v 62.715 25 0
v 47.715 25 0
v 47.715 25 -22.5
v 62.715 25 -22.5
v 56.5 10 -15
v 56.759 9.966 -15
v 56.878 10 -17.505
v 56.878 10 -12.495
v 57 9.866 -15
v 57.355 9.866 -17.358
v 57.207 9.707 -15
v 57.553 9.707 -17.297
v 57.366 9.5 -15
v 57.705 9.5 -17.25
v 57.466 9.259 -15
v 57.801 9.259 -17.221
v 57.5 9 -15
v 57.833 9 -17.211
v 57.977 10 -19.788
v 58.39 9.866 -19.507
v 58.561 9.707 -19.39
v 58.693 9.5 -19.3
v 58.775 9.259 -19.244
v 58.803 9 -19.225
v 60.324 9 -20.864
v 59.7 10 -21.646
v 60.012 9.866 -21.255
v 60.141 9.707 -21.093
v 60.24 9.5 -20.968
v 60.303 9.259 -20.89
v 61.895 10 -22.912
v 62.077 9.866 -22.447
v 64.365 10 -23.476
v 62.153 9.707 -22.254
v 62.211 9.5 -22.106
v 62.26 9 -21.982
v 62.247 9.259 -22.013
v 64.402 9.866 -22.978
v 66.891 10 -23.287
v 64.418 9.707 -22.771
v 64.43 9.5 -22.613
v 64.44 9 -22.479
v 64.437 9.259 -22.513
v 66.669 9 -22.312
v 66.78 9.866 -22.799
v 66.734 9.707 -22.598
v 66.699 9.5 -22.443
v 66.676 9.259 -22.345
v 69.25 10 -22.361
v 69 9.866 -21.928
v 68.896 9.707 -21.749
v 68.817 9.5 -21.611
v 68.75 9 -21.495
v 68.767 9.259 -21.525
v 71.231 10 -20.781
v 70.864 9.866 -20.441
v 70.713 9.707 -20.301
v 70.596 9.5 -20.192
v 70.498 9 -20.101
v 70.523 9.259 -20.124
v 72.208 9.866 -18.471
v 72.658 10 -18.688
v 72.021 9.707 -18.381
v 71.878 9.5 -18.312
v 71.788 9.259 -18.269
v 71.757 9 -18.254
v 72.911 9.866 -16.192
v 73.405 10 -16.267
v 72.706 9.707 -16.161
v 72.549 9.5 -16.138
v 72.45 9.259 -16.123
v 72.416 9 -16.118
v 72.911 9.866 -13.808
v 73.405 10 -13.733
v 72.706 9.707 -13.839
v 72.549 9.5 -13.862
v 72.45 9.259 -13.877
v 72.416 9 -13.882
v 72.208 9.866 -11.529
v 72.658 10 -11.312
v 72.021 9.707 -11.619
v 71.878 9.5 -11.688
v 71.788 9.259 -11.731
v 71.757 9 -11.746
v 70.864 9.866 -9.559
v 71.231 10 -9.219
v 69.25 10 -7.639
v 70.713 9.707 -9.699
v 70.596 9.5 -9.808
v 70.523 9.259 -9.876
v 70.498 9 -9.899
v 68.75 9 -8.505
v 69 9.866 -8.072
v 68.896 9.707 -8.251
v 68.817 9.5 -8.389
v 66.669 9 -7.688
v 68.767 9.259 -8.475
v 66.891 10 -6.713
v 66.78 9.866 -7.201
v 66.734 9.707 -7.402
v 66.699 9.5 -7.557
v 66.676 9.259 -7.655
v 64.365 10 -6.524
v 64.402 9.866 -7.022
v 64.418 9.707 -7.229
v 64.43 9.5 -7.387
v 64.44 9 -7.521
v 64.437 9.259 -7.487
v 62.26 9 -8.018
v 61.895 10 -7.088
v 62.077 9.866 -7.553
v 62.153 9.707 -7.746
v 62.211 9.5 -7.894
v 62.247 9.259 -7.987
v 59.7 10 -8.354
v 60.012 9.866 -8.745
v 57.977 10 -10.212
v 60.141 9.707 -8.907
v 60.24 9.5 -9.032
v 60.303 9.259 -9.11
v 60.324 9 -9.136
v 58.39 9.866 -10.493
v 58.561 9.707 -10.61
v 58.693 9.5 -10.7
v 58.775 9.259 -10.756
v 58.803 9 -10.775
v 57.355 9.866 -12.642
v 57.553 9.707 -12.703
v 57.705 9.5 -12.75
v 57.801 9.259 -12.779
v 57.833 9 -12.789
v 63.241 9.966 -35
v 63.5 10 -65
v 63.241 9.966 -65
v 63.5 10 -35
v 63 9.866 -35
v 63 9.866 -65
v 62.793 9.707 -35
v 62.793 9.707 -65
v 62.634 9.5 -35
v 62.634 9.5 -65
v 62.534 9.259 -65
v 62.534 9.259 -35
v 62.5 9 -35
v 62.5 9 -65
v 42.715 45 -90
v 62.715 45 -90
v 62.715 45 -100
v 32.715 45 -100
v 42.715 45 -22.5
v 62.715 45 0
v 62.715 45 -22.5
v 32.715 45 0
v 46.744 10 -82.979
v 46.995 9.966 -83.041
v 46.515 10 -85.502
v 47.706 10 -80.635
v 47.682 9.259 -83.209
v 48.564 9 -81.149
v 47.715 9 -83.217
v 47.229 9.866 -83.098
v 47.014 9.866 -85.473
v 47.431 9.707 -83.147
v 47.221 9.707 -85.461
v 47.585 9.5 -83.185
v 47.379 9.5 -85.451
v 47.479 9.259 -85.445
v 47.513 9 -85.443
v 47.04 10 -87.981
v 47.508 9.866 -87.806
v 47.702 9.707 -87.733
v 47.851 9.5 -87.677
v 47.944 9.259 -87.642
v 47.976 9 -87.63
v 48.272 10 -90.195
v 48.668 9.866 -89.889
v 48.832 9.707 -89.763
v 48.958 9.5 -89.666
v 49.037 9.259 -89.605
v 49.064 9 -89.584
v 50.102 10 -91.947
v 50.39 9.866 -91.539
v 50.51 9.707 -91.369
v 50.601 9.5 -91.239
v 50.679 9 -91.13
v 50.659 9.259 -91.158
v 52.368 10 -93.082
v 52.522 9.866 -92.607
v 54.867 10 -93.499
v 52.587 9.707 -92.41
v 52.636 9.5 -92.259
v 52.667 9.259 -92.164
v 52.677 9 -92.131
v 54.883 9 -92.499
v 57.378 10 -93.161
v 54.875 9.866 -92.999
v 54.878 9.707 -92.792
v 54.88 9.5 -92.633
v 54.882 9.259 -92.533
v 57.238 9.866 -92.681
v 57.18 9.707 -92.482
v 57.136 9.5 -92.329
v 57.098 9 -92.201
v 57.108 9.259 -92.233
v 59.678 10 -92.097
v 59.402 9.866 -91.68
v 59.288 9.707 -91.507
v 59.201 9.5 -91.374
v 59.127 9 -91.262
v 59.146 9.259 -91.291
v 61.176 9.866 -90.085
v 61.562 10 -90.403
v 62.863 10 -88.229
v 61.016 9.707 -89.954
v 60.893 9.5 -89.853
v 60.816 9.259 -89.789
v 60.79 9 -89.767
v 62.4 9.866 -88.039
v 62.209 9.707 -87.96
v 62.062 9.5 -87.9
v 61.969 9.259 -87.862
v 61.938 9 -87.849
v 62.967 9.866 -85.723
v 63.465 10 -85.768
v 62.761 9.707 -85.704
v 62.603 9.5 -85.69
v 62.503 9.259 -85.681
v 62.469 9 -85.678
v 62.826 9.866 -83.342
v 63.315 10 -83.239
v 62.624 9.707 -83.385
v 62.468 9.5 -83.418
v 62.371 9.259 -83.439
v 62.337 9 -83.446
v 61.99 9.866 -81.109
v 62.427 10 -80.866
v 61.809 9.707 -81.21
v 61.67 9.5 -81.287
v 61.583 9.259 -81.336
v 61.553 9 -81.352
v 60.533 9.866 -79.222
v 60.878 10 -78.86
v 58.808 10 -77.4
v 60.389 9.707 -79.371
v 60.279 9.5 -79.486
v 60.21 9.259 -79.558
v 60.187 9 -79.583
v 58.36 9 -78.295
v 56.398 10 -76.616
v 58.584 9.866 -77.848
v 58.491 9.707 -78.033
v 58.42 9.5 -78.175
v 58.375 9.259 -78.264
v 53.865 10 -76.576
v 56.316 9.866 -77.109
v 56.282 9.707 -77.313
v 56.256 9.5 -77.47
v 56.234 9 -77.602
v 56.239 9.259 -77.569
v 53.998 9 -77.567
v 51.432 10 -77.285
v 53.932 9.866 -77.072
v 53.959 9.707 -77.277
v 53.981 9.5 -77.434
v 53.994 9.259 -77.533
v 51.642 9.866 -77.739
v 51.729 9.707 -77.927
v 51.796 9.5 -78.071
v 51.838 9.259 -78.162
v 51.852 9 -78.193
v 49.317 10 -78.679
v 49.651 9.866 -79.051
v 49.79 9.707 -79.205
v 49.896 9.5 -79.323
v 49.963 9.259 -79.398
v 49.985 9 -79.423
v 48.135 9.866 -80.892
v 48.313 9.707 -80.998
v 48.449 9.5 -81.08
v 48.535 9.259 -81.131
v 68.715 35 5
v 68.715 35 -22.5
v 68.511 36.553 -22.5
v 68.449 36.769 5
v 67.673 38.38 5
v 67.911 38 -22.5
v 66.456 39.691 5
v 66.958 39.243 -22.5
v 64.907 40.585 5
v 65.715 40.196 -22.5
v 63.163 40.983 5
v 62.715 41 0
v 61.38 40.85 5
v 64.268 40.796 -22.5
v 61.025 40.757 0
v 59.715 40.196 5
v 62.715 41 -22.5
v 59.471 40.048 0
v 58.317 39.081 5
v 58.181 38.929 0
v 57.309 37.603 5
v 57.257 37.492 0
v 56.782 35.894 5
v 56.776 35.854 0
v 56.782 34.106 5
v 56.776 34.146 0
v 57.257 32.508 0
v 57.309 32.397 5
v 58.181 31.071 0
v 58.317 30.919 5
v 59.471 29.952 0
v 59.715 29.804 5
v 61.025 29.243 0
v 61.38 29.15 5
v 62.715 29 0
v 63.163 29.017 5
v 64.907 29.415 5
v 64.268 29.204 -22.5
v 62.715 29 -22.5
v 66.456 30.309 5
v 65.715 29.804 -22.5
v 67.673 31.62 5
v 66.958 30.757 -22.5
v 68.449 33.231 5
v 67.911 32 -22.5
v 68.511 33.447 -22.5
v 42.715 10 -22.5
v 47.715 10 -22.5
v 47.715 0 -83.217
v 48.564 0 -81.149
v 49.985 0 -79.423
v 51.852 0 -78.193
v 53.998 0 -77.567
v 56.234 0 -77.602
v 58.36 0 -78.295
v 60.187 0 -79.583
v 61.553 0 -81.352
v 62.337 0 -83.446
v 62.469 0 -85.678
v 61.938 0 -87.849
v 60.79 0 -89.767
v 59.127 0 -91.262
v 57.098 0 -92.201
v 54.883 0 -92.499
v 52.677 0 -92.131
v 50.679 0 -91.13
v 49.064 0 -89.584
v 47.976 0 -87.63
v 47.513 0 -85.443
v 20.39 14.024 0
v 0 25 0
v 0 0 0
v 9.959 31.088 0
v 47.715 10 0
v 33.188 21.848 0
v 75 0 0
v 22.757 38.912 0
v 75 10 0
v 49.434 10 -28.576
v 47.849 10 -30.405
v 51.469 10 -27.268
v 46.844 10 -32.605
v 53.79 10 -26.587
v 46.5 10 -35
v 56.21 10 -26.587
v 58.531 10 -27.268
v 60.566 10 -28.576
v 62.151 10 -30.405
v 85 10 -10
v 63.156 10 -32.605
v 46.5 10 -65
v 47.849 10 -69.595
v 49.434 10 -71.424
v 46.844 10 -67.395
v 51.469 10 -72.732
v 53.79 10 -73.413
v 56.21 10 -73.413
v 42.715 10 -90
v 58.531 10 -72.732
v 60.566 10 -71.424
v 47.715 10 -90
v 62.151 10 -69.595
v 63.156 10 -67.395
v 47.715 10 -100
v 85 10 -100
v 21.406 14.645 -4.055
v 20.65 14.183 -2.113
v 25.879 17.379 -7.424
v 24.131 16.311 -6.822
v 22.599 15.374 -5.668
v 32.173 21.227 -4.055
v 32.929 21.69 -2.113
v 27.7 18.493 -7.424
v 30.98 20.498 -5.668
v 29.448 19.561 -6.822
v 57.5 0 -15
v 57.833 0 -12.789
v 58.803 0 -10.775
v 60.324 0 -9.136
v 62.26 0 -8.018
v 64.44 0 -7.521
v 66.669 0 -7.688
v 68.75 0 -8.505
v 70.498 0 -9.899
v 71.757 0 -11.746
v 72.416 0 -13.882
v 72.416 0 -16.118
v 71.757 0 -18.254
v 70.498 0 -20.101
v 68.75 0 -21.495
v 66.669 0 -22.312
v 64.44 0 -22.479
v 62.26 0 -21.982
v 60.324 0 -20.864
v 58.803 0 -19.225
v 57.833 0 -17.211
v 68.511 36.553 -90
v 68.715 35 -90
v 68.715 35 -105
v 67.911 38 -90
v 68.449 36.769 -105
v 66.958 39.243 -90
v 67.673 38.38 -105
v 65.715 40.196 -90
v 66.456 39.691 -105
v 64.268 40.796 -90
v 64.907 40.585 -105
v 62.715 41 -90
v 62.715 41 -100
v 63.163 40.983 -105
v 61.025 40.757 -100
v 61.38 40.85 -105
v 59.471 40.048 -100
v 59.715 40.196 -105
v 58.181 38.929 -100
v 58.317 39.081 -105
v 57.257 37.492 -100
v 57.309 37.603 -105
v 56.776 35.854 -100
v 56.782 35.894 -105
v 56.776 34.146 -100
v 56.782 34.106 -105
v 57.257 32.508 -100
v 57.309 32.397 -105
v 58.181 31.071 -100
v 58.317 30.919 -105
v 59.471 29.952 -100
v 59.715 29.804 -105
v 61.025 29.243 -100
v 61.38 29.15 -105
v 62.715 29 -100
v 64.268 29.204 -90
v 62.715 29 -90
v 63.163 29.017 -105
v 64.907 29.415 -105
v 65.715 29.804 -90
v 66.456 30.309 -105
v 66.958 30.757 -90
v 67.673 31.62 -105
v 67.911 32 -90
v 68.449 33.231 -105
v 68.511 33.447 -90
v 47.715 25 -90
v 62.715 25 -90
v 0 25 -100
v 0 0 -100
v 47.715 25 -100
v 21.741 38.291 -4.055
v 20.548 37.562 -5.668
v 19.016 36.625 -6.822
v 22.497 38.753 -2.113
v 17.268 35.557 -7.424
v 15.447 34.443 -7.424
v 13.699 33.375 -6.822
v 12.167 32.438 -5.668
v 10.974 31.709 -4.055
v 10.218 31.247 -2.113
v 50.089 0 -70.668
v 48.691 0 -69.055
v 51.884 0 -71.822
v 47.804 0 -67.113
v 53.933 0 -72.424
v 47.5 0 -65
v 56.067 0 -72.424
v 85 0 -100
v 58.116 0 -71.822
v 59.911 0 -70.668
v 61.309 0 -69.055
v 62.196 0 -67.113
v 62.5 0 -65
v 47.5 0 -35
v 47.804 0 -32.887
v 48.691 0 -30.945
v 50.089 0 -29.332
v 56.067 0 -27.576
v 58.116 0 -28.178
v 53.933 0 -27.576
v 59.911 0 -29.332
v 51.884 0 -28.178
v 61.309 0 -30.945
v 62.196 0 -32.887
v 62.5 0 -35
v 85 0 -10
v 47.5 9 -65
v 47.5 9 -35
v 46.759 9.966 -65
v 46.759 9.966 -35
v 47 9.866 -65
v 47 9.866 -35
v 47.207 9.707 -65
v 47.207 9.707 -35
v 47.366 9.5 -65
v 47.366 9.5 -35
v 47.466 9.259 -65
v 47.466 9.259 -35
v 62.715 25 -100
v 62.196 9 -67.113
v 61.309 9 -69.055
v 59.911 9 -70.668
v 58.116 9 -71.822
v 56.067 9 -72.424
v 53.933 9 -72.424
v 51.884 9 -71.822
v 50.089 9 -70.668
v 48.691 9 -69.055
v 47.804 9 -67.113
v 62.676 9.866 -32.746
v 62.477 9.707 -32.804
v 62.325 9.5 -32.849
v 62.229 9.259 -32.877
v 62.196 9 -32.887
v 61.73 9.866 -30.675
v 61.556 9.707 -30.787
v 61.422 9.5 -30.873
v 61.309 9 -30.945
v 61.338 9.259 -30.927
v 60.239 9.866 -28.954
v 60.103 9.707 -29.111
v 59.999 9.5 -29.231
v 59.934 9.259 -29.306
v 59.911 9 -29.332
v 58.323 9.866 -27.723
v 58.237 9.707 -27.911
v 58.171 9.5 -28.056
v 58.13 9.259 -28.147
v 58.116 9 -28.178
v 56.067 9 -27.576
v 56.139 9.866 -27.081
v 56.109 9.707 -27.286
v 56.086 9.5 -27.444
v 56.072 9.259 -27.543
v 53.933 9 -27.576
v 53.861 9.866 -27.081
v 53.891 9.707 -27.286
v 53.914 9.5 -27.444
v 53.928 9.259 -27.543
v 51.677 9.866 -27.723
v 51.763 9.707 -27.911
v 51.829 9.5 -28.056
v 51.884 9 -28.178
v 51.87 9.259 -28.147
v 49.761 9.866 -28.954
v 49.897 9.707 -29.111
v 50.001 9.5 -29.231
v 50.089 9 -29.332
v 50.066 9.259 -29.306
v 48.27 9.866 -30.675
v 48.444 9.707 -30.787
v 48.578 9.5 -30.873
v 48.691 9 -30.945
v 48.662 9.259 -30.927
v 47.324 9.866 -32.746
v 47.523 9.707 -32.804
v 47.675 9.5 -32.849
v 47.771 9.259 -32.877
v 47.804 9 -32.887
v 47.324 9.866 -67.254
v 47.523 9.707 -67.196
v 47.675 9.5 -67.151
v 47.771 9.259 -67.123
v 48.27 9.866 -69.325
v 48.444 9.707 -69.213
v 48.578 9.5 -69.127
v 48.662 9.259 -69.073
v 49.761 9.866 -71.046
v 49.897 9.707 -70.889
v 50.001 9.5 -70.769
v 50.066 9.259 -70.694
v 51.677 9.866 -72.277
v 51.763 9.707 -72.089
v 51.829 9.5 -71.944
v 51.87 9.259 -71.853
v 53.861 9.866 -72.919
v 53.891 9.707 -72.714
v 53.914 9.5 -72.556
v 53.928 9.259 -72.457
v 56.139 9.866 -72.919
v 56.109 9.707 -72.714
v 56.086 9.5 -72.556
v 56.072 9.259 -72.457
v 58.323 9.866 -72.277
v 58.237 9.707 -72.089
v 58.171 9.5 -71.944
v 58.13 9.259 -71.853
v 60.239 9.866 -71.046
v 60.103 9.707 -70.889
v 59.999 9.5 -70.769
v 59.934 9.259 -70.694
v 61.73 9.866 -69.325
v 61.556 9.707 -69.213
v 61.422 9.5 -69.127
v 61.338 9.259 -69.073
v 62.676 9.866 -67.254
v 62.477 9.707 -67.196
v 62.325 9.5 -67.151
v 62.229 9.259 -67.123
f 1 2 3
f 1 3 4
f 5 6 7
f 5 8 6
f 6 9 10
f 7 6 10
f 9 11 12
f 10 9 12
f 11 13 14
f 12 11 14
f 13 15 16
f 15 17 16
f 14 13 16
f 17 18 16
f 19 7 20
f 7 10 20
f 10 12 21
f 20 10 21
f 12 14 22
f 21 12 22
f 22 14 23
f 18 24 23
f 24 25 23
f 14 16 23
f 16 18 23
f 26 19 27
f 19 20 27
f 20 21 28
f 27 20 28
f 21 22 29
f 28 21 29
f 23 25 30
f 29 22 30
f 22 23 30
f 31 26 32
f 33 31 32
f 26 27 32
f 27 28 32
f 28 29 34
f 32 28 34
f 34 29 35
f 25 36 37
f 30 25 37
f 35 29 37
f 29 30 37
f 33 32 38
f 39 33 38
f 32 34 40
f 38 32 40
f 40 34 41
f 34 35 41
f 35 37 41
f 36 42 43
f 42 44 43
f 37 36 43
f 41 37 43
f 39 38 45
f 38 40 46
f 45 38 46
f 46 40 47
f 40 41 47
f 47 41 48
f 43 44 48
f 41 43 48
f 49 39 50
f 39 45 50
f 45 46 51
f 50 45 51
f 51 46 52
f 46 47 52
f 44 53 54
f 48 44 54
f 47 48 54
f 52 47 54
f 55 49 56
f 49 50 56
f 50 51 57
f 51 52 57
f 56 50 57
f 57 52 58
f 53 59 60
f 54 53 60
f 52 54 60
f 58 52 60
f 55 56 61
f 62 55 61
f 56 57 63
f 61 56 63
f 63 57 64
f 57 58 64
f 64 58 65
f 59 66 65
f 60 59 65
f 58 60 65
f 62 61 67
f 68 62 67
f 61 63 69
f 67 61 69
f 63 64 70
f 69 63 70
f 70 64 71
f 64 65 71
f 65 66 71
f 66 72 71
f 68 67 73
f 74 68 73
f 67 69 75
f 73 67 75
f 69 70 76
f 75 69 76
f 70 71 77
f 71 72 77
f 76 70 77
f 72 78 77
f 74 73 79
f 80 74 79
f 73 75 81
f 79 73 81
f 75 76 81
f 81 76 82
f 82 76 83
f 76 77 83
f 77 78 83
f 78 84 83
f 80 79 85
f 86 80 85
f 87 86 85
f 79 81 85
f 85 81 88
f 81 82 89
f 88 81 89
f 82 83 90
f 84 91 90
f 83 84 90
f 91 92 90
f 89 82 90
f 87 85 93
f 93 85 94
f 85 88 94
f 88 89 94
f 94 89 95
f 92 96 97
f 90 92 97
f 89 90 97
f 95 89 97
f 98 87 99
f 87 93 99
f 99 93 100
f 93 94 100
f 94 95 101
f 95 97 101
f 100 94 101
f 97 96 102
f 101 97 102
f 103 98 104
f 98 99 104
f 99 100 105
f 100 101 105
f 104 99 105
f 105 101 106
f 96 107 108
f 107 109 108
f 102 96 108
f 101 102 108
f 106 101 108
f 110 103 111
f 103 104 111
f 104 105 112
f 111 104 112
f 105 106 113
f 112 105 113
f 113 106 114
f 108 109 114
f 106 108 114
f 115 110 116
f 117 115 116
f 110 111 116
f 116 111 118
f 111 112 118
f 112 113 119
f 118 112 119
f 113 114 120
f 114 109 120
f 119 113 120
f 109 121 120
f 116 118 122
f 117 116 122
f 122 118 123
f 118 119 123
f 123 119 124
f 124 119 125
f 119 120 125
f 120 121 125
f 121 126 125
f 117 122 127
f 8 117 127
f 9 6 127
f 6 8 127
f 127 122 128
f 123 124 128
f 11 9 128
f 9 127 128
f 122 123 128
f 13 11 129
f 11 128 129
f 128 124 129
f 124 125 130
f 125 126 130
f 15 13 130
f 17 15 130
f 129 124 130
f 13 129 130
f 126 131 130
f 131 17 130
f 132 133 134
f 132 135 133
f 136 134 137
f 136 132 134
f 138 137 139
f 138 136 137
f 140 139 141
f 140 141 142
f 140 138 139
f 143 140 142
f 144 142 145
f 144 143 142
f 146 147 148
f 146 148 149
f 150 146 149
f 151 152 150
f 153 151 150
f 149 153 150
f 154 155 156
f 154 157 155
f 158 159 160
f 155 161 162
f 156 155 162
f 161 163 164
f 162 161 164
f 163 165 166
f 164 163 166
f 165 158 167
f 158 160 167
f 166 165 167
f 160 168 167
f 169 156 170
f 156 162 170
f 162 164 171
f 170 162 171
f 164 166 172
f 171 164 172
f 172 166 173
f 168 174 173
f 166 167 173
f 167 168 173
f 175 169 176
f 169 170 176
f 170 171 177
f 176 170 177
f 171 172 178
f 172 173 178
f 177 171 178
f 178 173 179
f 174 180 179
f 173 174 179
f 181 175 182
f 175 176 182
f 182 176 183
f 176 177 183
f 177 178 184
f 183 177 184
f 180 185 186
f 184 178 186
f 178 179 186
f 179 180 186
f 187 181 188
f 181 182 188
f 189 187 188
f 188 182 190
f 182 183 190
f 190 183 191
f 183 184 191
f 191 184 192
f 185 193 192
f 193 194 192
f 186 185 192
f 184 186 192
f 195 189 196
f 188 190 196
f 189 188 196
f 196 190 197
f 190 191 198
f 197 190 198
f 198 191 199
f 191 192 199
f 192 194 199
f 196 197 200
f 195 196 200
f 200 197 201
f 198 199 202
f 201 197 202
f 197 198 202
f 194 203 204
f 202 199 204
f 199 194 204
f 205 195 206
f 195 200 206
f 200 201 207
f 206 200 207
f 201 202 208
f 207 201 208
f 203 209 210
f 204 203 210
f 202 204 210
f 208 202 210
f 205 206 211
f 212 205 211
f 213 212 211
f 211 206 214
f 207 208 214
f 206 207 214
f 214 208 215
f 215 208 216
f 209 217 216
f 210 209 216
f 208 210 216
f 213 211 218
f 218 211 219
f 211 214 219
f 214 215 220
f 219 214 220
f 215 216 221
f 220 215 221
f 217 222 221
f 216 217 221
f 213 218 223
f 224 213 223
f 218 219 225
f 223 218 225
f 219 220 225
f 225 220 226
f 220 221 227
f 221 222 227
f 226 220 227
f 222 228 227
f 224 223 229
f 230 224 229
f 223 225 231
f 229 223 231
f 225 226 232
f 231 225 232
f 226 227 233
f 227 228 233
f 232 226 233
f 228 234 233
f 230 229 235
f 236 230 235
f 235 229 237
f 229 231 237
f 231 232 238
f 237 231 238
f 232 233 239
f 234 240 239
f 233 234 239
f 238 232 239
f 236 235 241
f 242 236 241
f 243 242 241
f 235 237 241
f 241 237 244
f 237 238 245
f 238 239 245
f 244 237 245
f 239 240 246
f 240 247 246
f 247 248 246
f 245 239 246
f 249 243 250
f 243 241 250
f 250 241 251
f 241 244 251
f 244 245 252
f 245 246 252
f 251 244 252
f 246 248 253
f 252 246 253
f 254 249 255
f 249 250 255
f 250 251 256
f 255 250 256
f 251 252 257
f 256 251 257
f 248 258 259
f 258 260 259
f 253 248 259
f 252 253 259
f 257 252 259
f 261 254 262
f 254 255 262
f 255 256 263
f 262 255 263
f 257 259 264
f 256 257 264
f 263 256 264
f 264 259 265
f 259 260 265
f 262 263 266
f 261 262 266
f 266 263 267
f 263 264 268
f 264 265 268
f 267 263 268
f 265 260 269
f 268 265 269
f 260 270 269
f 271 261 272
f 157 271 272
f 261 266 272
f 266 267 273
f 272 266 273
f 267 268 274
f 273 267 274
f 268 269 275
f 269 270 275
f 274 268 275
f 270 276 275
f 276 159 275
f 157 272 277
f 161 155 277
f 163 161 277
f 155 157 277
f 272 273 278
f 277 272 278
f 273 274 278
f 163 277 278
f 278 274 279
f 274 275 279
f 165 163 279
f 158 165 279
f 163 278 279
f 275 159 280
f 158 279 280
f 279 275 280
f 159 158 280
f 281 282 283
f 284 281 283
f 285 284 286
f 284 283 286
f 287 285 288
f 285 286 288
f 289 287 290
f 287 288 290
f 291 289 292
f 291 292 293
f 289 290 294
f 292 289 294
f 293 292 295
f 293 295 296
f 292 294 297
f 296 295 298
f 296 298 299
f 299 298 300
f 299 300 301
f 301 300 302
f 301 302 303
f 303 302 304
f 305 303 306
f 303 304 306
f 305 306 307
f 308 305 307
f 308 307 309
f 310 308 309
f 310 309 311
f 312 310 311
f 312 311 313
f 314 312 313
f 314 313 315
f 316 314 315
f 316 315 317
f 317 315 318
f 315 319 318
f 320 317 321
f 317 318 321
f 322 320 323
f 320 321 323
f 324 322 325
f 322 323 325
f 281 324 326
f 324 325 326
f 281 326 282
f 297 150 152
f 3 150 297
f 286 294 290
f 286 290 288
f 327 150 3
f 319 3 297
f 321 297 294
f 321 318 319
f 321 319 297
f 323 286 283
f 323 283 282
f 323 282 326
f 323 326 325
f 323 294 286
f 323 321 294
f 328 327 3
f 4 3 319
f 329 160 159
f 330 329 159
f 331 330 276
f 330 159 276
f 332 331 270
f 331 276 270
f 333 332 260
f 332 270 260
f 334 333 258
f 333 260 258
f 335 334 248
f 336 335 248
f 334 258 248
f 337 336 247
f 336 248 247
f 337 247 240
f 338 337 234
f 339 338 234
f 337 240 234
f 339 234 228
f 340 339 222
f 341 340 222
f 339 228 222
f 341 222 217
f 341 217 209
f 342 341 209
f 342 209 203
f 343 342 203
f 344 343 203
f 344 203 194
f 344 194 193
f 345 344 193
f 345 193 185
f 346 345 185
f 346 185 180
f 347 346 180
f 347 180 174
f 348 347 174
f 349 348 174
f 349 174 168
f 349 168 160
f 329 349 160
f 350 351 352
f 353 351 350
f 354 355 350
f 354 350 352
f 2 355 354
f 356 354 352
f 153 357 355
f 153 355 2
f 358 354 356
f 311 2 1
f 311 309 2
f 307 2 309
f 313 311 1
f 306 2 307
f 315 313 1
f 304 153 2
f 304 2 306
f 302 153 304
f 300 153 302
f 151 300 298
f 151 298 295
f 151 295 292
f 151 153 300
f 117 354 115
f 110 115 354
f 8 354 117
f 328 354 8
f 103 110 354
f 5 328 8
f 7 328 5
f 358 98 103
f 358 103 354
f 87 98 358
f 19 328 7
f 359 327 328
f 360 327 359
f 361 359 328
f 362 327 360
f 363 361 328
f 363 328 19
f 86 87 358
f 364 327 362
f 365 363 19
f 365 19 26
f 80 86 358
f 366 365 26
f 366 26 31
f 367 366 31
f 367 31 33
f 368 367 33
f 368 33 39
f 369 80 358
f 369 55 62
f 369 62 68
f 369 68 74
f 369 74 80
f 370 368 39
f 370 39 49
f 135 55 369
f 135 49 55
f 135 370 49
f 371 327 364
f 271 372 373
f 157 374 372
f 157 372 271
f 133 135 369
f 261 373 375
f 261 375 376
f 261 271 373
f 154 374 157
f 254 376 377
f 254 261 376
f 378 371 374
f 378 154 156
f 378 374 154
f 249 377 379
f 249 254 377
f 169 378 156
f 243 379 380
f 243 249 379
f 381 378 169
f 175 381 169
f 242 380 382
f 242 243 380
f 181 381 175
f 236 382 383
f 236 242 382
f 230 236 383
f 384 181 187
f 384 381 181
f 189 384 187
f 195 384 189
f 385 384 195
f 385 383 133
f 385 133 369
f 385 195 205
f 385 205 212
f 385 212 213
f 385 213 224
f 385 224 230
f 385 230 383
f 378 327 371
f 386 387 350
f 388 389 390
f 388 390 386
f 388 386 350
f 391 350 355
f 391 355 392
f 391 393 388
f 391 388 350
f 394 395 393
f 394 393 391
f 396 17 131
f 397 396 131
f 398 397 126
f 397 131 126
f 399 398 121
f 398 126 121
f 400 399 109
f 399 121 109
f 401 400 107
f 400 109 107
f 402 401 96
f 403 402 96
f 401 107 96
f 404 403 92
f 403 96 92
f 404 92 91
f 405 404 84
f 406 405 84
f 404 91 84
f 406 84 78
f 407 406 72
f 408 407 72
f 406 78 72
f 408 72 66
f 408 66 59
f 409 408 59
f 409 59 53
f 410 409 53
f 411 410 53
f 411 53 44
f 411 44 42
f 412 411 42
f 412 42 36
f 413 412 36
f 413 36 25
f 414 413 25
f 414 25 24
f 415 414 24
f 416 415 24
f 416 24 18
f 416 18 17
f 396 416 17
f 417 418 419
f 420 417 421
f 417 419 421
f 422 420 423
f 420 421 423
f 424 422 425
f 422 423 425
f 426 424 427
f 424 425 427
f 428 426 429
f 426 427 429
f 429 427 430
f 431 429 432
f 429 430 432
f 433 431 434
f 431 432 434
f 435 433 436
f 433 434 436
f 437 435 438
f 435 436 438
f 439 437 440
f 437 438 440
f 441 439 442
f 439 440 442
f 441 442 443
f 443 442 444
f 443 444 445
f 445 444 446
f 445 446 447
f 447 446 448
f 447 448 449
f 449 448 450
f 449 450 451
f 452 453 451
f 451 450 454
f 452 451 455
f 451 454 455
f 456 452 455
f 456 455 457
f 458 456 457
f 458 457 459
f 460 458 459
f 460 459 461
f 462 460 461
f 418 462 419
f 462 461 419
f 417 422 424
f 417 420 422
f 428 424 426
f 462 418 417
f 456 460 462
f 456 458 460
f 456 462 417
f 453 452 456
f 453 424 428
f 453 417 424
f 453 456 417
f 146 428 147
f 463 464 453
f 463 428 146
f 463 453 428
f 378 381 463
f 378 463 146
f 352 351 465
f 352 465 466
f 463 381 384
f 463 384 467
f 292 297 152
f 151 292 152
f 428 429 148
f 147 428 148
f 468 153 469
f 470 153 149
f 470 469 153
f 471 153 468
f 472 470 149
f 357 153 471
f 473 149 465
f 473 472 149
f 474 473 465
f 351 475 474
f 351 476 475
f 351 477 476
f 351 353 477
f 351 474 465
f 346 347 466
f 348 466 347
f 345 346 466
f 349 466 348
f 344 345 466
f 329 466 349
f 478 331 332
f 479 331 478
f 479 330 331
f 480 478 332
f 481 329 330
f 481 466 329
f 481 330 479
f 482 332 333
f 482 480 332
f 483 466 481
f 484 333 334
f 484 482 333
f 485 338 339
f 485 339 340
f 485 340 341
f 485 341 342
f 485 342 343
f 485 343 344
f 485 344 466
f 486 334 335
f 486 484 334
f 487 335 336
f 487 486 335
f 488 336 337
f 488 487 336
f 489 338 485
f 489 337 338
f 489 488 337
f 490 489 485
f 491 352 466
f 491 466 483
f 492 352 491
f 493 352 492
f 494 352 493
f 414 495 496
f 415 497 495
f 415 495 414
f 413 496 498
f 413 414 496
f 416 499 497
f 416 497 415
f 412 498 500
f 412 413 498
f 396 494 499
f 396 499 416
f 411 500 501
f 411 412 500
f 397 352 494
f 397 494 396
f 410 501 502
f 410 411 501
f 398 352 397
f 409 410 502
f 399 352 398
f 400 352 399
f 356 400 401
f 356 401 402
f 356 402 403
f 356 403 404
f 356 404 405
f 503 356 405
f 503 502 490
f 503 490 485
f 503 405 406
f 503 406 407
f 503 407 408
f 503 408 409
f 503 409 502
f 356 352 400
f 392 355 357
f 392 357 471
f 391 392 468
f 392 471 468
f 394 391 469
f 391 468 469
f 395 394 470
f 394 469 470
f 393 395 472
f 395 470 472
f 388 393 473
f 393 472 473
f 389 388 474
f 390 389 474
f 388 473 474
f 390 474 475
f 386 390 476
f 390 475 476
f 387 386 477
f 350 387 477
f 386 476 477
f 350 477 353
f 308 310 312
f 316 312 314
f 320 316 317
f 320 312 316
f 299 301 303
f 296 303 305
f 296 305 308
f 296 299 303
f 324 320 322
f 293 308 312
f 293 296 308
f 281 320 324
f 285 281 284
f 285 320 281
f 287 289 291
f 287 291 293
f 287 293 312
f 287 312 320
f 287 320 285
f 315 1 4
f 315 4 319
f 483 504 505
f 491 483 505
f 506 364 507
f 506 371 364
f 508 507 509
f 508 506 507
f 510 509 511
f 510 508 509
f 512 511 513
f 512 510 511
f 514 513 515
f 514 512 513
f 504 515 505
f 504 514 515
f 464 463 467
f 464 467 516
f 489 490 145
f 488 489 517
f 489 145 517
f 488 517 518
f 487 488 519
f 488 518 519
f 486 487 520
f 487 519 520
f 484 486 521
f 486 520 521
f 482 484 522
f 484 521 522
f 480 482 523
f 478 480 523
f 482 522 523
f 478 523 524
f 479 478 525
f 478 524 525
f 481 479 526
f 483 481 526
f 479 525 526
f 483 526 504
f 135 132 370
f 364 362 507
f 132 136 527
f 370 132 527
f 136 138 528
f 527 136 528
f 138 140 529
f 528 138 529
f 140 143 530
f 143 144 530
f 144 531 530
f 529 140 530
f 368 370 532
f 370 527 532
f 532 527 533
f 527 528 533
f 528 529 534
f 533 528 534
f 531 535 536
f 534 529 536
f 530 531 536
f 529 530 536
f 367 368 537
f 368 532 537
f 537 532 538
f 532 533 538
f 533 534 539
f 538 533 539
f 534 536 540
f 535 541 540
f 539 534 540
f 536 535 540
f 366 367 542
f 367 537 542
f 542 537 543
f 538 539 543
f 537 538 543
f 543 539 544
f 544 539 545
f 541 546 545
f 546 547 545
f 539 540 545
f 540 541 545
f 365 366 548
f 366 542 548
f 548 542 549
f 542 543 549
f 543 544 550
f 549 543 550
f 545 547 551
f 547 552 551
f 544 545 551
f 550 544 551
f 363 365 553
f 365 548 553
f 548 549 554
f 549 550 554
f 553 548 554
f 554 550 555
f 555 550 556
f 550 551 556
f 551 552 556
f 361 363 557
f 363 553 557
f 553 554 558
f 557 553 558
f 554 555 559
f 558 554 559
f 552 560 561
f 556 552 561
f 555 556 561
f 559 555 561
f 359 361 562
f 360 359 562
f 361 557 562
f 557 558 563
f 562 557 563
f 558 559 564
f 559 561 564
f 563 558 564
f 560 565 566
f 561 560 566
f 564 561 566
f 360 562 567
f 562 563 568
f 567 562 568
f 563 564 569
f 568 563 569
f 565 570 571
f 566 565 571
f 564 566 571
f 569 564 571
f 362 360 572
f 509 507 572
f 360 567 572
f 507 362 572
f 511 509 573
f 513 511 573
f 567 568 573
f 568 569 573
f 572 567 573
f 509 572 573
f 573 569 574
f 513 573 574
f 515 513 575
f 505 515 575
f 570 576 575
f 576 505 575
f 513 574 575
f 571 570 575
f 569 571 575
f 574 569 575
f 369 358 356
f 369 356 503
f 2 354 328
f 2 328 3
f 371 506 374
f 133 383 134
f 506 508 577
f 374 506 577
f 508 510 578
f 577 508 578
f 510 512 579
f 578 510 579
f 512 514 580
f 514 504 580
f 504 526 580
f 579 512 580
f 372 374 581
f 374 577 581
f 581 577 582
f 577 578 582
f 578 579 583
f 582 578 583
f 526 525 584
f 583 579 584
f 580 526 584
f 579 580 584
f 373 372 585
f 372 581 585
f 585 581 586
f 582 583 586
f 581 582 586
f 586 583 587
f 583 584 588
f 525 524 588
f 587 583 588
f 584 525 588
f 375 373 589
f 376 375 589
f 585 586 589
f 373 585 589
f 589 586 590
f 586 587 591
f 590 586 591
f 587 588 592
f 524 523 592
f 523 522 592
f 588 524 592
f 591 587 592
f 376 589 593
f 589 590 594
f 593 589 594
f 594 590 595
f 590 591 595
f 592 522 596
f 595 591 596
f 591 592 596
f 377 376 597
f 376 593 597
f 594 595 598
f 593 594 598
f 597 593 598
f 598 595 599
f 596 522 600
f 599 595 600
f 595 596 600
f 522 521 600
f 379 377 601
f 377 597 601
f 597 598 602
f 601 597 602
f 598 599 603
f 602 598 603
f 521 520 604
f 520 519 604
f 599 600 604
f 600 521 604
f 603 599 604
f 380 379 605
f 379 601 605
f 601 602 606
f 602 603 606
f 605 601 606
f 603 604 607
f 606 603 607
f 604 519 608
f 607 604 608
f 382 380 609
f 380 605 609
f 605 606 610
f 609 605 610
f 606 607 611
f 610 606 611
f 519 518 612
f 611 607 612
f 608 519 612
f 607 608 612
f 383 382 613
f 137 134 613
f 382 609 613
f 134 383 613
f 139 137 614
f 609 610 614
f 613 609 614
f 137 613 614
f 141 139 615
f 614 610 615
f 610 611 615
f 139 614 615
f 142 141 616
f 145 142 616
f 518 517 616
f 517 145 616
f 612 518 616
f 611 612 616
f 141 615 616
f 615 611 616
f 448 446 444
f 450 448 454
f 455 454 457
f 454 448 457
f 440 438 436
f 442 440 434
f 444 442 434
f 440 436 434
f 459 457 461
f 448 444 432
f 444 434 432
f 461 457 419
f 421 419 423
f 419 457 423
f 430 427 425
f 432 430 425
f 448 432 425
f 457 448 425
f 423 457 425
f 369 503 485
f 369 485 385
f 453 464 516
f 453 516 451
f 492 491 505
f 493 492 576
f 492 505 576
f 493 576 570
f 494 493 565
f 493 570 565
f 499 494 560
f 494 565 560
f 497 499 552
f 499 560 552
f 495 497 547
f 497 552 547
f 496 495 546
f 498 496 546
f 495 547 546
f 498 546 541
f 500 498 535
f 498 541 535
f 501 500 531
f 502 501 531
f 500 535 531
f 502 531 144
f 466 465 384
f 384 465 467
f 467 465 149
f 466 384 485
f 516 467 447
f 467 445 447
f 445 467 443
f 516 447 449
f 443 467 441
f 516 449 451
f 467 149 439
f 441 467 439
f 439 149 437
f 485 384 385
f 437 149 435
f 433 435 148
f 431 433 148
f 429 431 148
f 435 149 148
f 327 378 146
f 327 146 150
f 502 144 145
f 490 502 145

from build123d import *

# Parameters (mm, degrees)
BOSS_EXTRUDE1_DEPTH      = 100
SKETCH2_R                = 7.5
CUT_EXTRUDE2_DEPTH       = 100
SKETCH3_R                = 7.5
CUT_EXTRUDE3_DEPTH       = 100
CUT_EXTRUDE4_DEPTH       = 100
SKETCH5_R                = 7.5
CUT_EXTRUDE5_DEPTH       = 20
BOSS_EXTRUDE2_DEPTH      = 5
BOSS_EXTRUDE2_DEPTH_BACK = 105
SKETCH7_R                = 6
CUT_EXTRUDE6_START       = -35
CUT_EXTRUDE6_DEPTH       = 35
FILLET1_R                = 1


with BuildPart() as part:
    # Sketch1 → Boss-Extrude1 (new body)
    with BuildSketch(Plane.XY):
        Polygon((0, 0), (85, 0), (85, 10), (47.715081247, 10), (47.715081247, 25), (62.715081247, 25), (62.715081247, 45), (32.715081247, 45), (0, 25), align=None)
    extrude(amount=-BOSS_EXTRUDE1_DEPTH)

    # Sketch2 → Cut-Extrude2 (cut)
    with BuildSketch(Plane(origin=(0, 10, 0), x_dir=(1, 0, 0), z_dir=(0, 1, 0))):
        with Locations(Location((65, 15, 0), (0, 0, 180))):
            Circle(SKETCH2_R)
        with BuildLine():
            Line((47.5, 65), (47.5, 35))
            ThreePointArc((47.5, 35), (55, 27.5), (62.5, 35))
            Line((62.5, 35), (62.5, 65))
            ThreePointArc((62.5, 65), (55, 72.5), (47.5, 65))
        make_face()
    extrude(amount=-CUT_EXTRUDE2_DEPTH, mode=Mode.SUBTRACT)

    # Sketch3 → Cut-Extrude3 (cut)
    with BuildSketch(Plane(origin=(0, 10, 0), x_dir=(1, 0, 0), z_dir=(0, 1, 0))):
        with Locations(Location((55, 85, 0), (0, 0, 193.754716541))):
            Circle(SKETCH3_R)
    extrude(amount=-CUT_EXTRUDE3_DEPTH, mode=Mode.SUBTRACT)

    # Sketch4 → Cut-Extrude4 (cut)
    with BuildSketch(Plane(origin=(0, 10, 0), x_dir=(1, 0, 0), z_dir=(0, 1, 0))):
        Polygon((75, 0), (85, 10), (85, 0), align=None)
    extrude(amount=-CUT_EXTRUDE4_DEPTH, mode=Mode.SUBTRACT)

    # Sketch5 → Cut-Extrude5 (cut)
    with BuildSketch(Plane(origin=(-11.125485694, 18.19855842, 0), x_dir=(0.8531953684822633, 0.5215914715564423, 0), z_dir=(-0.5215914715564423, 0.8531953684822633, 0))):
        with Locations((32.211879404, 0)):
            Circle(SKETCH5_R)
    extrude(amount=-CUT_EXTRUDE5_DEPTH, mode=Mode.SUBTRACT)

    # Sketch7 → Boss-Extrude2 (add, two sides: drawn at the far end of the back side and taken through both)
    with BuildSketch(Plane.XY.offset(-BOSS_EXTRUDE2_DEPTH_BACK)):
        with Locations((62.715081247, 35)):
            Circle(SKETCH7_R)
    extrude(amount=BOSS_EXTRUDE2_DEPTH + BOSS_EXTRUDE2_DEPTH_BACK)

    # Sketch8 → Cut-Extrude6 (cut)
    with BuildSketch(Plane(origin=(0, 45, 0), x_dir=(1, 0, 0), z_dir=(0, 1, 0)).offset(CUT_EXTRUDE6_START)):
        Polygon((62.715081247, 90), (42.715081247, 90), (42.715081247, 22.5), (72.715081247, 22.5), (72.715081247, 90), align=None)
    extrude(amount=CUT_EXTRUDE6_DEPTH, mode=Mode.SUBTRACT)

    # Fillet1
    fillet1_edges = [part.edges().sort_by_distance(p)[0] for p in [
        (55, 10, -27.5),
        (55, 10, -72.5),
        (62.5, 10, -50),
        (47.5, 10, -50),
        (72.5, 10, -15),
        (62.284918753, 10, -86.783243887),
    ]]
    fillet(fillet1_edges, radius=FILLET1_R)


solid = part.part
